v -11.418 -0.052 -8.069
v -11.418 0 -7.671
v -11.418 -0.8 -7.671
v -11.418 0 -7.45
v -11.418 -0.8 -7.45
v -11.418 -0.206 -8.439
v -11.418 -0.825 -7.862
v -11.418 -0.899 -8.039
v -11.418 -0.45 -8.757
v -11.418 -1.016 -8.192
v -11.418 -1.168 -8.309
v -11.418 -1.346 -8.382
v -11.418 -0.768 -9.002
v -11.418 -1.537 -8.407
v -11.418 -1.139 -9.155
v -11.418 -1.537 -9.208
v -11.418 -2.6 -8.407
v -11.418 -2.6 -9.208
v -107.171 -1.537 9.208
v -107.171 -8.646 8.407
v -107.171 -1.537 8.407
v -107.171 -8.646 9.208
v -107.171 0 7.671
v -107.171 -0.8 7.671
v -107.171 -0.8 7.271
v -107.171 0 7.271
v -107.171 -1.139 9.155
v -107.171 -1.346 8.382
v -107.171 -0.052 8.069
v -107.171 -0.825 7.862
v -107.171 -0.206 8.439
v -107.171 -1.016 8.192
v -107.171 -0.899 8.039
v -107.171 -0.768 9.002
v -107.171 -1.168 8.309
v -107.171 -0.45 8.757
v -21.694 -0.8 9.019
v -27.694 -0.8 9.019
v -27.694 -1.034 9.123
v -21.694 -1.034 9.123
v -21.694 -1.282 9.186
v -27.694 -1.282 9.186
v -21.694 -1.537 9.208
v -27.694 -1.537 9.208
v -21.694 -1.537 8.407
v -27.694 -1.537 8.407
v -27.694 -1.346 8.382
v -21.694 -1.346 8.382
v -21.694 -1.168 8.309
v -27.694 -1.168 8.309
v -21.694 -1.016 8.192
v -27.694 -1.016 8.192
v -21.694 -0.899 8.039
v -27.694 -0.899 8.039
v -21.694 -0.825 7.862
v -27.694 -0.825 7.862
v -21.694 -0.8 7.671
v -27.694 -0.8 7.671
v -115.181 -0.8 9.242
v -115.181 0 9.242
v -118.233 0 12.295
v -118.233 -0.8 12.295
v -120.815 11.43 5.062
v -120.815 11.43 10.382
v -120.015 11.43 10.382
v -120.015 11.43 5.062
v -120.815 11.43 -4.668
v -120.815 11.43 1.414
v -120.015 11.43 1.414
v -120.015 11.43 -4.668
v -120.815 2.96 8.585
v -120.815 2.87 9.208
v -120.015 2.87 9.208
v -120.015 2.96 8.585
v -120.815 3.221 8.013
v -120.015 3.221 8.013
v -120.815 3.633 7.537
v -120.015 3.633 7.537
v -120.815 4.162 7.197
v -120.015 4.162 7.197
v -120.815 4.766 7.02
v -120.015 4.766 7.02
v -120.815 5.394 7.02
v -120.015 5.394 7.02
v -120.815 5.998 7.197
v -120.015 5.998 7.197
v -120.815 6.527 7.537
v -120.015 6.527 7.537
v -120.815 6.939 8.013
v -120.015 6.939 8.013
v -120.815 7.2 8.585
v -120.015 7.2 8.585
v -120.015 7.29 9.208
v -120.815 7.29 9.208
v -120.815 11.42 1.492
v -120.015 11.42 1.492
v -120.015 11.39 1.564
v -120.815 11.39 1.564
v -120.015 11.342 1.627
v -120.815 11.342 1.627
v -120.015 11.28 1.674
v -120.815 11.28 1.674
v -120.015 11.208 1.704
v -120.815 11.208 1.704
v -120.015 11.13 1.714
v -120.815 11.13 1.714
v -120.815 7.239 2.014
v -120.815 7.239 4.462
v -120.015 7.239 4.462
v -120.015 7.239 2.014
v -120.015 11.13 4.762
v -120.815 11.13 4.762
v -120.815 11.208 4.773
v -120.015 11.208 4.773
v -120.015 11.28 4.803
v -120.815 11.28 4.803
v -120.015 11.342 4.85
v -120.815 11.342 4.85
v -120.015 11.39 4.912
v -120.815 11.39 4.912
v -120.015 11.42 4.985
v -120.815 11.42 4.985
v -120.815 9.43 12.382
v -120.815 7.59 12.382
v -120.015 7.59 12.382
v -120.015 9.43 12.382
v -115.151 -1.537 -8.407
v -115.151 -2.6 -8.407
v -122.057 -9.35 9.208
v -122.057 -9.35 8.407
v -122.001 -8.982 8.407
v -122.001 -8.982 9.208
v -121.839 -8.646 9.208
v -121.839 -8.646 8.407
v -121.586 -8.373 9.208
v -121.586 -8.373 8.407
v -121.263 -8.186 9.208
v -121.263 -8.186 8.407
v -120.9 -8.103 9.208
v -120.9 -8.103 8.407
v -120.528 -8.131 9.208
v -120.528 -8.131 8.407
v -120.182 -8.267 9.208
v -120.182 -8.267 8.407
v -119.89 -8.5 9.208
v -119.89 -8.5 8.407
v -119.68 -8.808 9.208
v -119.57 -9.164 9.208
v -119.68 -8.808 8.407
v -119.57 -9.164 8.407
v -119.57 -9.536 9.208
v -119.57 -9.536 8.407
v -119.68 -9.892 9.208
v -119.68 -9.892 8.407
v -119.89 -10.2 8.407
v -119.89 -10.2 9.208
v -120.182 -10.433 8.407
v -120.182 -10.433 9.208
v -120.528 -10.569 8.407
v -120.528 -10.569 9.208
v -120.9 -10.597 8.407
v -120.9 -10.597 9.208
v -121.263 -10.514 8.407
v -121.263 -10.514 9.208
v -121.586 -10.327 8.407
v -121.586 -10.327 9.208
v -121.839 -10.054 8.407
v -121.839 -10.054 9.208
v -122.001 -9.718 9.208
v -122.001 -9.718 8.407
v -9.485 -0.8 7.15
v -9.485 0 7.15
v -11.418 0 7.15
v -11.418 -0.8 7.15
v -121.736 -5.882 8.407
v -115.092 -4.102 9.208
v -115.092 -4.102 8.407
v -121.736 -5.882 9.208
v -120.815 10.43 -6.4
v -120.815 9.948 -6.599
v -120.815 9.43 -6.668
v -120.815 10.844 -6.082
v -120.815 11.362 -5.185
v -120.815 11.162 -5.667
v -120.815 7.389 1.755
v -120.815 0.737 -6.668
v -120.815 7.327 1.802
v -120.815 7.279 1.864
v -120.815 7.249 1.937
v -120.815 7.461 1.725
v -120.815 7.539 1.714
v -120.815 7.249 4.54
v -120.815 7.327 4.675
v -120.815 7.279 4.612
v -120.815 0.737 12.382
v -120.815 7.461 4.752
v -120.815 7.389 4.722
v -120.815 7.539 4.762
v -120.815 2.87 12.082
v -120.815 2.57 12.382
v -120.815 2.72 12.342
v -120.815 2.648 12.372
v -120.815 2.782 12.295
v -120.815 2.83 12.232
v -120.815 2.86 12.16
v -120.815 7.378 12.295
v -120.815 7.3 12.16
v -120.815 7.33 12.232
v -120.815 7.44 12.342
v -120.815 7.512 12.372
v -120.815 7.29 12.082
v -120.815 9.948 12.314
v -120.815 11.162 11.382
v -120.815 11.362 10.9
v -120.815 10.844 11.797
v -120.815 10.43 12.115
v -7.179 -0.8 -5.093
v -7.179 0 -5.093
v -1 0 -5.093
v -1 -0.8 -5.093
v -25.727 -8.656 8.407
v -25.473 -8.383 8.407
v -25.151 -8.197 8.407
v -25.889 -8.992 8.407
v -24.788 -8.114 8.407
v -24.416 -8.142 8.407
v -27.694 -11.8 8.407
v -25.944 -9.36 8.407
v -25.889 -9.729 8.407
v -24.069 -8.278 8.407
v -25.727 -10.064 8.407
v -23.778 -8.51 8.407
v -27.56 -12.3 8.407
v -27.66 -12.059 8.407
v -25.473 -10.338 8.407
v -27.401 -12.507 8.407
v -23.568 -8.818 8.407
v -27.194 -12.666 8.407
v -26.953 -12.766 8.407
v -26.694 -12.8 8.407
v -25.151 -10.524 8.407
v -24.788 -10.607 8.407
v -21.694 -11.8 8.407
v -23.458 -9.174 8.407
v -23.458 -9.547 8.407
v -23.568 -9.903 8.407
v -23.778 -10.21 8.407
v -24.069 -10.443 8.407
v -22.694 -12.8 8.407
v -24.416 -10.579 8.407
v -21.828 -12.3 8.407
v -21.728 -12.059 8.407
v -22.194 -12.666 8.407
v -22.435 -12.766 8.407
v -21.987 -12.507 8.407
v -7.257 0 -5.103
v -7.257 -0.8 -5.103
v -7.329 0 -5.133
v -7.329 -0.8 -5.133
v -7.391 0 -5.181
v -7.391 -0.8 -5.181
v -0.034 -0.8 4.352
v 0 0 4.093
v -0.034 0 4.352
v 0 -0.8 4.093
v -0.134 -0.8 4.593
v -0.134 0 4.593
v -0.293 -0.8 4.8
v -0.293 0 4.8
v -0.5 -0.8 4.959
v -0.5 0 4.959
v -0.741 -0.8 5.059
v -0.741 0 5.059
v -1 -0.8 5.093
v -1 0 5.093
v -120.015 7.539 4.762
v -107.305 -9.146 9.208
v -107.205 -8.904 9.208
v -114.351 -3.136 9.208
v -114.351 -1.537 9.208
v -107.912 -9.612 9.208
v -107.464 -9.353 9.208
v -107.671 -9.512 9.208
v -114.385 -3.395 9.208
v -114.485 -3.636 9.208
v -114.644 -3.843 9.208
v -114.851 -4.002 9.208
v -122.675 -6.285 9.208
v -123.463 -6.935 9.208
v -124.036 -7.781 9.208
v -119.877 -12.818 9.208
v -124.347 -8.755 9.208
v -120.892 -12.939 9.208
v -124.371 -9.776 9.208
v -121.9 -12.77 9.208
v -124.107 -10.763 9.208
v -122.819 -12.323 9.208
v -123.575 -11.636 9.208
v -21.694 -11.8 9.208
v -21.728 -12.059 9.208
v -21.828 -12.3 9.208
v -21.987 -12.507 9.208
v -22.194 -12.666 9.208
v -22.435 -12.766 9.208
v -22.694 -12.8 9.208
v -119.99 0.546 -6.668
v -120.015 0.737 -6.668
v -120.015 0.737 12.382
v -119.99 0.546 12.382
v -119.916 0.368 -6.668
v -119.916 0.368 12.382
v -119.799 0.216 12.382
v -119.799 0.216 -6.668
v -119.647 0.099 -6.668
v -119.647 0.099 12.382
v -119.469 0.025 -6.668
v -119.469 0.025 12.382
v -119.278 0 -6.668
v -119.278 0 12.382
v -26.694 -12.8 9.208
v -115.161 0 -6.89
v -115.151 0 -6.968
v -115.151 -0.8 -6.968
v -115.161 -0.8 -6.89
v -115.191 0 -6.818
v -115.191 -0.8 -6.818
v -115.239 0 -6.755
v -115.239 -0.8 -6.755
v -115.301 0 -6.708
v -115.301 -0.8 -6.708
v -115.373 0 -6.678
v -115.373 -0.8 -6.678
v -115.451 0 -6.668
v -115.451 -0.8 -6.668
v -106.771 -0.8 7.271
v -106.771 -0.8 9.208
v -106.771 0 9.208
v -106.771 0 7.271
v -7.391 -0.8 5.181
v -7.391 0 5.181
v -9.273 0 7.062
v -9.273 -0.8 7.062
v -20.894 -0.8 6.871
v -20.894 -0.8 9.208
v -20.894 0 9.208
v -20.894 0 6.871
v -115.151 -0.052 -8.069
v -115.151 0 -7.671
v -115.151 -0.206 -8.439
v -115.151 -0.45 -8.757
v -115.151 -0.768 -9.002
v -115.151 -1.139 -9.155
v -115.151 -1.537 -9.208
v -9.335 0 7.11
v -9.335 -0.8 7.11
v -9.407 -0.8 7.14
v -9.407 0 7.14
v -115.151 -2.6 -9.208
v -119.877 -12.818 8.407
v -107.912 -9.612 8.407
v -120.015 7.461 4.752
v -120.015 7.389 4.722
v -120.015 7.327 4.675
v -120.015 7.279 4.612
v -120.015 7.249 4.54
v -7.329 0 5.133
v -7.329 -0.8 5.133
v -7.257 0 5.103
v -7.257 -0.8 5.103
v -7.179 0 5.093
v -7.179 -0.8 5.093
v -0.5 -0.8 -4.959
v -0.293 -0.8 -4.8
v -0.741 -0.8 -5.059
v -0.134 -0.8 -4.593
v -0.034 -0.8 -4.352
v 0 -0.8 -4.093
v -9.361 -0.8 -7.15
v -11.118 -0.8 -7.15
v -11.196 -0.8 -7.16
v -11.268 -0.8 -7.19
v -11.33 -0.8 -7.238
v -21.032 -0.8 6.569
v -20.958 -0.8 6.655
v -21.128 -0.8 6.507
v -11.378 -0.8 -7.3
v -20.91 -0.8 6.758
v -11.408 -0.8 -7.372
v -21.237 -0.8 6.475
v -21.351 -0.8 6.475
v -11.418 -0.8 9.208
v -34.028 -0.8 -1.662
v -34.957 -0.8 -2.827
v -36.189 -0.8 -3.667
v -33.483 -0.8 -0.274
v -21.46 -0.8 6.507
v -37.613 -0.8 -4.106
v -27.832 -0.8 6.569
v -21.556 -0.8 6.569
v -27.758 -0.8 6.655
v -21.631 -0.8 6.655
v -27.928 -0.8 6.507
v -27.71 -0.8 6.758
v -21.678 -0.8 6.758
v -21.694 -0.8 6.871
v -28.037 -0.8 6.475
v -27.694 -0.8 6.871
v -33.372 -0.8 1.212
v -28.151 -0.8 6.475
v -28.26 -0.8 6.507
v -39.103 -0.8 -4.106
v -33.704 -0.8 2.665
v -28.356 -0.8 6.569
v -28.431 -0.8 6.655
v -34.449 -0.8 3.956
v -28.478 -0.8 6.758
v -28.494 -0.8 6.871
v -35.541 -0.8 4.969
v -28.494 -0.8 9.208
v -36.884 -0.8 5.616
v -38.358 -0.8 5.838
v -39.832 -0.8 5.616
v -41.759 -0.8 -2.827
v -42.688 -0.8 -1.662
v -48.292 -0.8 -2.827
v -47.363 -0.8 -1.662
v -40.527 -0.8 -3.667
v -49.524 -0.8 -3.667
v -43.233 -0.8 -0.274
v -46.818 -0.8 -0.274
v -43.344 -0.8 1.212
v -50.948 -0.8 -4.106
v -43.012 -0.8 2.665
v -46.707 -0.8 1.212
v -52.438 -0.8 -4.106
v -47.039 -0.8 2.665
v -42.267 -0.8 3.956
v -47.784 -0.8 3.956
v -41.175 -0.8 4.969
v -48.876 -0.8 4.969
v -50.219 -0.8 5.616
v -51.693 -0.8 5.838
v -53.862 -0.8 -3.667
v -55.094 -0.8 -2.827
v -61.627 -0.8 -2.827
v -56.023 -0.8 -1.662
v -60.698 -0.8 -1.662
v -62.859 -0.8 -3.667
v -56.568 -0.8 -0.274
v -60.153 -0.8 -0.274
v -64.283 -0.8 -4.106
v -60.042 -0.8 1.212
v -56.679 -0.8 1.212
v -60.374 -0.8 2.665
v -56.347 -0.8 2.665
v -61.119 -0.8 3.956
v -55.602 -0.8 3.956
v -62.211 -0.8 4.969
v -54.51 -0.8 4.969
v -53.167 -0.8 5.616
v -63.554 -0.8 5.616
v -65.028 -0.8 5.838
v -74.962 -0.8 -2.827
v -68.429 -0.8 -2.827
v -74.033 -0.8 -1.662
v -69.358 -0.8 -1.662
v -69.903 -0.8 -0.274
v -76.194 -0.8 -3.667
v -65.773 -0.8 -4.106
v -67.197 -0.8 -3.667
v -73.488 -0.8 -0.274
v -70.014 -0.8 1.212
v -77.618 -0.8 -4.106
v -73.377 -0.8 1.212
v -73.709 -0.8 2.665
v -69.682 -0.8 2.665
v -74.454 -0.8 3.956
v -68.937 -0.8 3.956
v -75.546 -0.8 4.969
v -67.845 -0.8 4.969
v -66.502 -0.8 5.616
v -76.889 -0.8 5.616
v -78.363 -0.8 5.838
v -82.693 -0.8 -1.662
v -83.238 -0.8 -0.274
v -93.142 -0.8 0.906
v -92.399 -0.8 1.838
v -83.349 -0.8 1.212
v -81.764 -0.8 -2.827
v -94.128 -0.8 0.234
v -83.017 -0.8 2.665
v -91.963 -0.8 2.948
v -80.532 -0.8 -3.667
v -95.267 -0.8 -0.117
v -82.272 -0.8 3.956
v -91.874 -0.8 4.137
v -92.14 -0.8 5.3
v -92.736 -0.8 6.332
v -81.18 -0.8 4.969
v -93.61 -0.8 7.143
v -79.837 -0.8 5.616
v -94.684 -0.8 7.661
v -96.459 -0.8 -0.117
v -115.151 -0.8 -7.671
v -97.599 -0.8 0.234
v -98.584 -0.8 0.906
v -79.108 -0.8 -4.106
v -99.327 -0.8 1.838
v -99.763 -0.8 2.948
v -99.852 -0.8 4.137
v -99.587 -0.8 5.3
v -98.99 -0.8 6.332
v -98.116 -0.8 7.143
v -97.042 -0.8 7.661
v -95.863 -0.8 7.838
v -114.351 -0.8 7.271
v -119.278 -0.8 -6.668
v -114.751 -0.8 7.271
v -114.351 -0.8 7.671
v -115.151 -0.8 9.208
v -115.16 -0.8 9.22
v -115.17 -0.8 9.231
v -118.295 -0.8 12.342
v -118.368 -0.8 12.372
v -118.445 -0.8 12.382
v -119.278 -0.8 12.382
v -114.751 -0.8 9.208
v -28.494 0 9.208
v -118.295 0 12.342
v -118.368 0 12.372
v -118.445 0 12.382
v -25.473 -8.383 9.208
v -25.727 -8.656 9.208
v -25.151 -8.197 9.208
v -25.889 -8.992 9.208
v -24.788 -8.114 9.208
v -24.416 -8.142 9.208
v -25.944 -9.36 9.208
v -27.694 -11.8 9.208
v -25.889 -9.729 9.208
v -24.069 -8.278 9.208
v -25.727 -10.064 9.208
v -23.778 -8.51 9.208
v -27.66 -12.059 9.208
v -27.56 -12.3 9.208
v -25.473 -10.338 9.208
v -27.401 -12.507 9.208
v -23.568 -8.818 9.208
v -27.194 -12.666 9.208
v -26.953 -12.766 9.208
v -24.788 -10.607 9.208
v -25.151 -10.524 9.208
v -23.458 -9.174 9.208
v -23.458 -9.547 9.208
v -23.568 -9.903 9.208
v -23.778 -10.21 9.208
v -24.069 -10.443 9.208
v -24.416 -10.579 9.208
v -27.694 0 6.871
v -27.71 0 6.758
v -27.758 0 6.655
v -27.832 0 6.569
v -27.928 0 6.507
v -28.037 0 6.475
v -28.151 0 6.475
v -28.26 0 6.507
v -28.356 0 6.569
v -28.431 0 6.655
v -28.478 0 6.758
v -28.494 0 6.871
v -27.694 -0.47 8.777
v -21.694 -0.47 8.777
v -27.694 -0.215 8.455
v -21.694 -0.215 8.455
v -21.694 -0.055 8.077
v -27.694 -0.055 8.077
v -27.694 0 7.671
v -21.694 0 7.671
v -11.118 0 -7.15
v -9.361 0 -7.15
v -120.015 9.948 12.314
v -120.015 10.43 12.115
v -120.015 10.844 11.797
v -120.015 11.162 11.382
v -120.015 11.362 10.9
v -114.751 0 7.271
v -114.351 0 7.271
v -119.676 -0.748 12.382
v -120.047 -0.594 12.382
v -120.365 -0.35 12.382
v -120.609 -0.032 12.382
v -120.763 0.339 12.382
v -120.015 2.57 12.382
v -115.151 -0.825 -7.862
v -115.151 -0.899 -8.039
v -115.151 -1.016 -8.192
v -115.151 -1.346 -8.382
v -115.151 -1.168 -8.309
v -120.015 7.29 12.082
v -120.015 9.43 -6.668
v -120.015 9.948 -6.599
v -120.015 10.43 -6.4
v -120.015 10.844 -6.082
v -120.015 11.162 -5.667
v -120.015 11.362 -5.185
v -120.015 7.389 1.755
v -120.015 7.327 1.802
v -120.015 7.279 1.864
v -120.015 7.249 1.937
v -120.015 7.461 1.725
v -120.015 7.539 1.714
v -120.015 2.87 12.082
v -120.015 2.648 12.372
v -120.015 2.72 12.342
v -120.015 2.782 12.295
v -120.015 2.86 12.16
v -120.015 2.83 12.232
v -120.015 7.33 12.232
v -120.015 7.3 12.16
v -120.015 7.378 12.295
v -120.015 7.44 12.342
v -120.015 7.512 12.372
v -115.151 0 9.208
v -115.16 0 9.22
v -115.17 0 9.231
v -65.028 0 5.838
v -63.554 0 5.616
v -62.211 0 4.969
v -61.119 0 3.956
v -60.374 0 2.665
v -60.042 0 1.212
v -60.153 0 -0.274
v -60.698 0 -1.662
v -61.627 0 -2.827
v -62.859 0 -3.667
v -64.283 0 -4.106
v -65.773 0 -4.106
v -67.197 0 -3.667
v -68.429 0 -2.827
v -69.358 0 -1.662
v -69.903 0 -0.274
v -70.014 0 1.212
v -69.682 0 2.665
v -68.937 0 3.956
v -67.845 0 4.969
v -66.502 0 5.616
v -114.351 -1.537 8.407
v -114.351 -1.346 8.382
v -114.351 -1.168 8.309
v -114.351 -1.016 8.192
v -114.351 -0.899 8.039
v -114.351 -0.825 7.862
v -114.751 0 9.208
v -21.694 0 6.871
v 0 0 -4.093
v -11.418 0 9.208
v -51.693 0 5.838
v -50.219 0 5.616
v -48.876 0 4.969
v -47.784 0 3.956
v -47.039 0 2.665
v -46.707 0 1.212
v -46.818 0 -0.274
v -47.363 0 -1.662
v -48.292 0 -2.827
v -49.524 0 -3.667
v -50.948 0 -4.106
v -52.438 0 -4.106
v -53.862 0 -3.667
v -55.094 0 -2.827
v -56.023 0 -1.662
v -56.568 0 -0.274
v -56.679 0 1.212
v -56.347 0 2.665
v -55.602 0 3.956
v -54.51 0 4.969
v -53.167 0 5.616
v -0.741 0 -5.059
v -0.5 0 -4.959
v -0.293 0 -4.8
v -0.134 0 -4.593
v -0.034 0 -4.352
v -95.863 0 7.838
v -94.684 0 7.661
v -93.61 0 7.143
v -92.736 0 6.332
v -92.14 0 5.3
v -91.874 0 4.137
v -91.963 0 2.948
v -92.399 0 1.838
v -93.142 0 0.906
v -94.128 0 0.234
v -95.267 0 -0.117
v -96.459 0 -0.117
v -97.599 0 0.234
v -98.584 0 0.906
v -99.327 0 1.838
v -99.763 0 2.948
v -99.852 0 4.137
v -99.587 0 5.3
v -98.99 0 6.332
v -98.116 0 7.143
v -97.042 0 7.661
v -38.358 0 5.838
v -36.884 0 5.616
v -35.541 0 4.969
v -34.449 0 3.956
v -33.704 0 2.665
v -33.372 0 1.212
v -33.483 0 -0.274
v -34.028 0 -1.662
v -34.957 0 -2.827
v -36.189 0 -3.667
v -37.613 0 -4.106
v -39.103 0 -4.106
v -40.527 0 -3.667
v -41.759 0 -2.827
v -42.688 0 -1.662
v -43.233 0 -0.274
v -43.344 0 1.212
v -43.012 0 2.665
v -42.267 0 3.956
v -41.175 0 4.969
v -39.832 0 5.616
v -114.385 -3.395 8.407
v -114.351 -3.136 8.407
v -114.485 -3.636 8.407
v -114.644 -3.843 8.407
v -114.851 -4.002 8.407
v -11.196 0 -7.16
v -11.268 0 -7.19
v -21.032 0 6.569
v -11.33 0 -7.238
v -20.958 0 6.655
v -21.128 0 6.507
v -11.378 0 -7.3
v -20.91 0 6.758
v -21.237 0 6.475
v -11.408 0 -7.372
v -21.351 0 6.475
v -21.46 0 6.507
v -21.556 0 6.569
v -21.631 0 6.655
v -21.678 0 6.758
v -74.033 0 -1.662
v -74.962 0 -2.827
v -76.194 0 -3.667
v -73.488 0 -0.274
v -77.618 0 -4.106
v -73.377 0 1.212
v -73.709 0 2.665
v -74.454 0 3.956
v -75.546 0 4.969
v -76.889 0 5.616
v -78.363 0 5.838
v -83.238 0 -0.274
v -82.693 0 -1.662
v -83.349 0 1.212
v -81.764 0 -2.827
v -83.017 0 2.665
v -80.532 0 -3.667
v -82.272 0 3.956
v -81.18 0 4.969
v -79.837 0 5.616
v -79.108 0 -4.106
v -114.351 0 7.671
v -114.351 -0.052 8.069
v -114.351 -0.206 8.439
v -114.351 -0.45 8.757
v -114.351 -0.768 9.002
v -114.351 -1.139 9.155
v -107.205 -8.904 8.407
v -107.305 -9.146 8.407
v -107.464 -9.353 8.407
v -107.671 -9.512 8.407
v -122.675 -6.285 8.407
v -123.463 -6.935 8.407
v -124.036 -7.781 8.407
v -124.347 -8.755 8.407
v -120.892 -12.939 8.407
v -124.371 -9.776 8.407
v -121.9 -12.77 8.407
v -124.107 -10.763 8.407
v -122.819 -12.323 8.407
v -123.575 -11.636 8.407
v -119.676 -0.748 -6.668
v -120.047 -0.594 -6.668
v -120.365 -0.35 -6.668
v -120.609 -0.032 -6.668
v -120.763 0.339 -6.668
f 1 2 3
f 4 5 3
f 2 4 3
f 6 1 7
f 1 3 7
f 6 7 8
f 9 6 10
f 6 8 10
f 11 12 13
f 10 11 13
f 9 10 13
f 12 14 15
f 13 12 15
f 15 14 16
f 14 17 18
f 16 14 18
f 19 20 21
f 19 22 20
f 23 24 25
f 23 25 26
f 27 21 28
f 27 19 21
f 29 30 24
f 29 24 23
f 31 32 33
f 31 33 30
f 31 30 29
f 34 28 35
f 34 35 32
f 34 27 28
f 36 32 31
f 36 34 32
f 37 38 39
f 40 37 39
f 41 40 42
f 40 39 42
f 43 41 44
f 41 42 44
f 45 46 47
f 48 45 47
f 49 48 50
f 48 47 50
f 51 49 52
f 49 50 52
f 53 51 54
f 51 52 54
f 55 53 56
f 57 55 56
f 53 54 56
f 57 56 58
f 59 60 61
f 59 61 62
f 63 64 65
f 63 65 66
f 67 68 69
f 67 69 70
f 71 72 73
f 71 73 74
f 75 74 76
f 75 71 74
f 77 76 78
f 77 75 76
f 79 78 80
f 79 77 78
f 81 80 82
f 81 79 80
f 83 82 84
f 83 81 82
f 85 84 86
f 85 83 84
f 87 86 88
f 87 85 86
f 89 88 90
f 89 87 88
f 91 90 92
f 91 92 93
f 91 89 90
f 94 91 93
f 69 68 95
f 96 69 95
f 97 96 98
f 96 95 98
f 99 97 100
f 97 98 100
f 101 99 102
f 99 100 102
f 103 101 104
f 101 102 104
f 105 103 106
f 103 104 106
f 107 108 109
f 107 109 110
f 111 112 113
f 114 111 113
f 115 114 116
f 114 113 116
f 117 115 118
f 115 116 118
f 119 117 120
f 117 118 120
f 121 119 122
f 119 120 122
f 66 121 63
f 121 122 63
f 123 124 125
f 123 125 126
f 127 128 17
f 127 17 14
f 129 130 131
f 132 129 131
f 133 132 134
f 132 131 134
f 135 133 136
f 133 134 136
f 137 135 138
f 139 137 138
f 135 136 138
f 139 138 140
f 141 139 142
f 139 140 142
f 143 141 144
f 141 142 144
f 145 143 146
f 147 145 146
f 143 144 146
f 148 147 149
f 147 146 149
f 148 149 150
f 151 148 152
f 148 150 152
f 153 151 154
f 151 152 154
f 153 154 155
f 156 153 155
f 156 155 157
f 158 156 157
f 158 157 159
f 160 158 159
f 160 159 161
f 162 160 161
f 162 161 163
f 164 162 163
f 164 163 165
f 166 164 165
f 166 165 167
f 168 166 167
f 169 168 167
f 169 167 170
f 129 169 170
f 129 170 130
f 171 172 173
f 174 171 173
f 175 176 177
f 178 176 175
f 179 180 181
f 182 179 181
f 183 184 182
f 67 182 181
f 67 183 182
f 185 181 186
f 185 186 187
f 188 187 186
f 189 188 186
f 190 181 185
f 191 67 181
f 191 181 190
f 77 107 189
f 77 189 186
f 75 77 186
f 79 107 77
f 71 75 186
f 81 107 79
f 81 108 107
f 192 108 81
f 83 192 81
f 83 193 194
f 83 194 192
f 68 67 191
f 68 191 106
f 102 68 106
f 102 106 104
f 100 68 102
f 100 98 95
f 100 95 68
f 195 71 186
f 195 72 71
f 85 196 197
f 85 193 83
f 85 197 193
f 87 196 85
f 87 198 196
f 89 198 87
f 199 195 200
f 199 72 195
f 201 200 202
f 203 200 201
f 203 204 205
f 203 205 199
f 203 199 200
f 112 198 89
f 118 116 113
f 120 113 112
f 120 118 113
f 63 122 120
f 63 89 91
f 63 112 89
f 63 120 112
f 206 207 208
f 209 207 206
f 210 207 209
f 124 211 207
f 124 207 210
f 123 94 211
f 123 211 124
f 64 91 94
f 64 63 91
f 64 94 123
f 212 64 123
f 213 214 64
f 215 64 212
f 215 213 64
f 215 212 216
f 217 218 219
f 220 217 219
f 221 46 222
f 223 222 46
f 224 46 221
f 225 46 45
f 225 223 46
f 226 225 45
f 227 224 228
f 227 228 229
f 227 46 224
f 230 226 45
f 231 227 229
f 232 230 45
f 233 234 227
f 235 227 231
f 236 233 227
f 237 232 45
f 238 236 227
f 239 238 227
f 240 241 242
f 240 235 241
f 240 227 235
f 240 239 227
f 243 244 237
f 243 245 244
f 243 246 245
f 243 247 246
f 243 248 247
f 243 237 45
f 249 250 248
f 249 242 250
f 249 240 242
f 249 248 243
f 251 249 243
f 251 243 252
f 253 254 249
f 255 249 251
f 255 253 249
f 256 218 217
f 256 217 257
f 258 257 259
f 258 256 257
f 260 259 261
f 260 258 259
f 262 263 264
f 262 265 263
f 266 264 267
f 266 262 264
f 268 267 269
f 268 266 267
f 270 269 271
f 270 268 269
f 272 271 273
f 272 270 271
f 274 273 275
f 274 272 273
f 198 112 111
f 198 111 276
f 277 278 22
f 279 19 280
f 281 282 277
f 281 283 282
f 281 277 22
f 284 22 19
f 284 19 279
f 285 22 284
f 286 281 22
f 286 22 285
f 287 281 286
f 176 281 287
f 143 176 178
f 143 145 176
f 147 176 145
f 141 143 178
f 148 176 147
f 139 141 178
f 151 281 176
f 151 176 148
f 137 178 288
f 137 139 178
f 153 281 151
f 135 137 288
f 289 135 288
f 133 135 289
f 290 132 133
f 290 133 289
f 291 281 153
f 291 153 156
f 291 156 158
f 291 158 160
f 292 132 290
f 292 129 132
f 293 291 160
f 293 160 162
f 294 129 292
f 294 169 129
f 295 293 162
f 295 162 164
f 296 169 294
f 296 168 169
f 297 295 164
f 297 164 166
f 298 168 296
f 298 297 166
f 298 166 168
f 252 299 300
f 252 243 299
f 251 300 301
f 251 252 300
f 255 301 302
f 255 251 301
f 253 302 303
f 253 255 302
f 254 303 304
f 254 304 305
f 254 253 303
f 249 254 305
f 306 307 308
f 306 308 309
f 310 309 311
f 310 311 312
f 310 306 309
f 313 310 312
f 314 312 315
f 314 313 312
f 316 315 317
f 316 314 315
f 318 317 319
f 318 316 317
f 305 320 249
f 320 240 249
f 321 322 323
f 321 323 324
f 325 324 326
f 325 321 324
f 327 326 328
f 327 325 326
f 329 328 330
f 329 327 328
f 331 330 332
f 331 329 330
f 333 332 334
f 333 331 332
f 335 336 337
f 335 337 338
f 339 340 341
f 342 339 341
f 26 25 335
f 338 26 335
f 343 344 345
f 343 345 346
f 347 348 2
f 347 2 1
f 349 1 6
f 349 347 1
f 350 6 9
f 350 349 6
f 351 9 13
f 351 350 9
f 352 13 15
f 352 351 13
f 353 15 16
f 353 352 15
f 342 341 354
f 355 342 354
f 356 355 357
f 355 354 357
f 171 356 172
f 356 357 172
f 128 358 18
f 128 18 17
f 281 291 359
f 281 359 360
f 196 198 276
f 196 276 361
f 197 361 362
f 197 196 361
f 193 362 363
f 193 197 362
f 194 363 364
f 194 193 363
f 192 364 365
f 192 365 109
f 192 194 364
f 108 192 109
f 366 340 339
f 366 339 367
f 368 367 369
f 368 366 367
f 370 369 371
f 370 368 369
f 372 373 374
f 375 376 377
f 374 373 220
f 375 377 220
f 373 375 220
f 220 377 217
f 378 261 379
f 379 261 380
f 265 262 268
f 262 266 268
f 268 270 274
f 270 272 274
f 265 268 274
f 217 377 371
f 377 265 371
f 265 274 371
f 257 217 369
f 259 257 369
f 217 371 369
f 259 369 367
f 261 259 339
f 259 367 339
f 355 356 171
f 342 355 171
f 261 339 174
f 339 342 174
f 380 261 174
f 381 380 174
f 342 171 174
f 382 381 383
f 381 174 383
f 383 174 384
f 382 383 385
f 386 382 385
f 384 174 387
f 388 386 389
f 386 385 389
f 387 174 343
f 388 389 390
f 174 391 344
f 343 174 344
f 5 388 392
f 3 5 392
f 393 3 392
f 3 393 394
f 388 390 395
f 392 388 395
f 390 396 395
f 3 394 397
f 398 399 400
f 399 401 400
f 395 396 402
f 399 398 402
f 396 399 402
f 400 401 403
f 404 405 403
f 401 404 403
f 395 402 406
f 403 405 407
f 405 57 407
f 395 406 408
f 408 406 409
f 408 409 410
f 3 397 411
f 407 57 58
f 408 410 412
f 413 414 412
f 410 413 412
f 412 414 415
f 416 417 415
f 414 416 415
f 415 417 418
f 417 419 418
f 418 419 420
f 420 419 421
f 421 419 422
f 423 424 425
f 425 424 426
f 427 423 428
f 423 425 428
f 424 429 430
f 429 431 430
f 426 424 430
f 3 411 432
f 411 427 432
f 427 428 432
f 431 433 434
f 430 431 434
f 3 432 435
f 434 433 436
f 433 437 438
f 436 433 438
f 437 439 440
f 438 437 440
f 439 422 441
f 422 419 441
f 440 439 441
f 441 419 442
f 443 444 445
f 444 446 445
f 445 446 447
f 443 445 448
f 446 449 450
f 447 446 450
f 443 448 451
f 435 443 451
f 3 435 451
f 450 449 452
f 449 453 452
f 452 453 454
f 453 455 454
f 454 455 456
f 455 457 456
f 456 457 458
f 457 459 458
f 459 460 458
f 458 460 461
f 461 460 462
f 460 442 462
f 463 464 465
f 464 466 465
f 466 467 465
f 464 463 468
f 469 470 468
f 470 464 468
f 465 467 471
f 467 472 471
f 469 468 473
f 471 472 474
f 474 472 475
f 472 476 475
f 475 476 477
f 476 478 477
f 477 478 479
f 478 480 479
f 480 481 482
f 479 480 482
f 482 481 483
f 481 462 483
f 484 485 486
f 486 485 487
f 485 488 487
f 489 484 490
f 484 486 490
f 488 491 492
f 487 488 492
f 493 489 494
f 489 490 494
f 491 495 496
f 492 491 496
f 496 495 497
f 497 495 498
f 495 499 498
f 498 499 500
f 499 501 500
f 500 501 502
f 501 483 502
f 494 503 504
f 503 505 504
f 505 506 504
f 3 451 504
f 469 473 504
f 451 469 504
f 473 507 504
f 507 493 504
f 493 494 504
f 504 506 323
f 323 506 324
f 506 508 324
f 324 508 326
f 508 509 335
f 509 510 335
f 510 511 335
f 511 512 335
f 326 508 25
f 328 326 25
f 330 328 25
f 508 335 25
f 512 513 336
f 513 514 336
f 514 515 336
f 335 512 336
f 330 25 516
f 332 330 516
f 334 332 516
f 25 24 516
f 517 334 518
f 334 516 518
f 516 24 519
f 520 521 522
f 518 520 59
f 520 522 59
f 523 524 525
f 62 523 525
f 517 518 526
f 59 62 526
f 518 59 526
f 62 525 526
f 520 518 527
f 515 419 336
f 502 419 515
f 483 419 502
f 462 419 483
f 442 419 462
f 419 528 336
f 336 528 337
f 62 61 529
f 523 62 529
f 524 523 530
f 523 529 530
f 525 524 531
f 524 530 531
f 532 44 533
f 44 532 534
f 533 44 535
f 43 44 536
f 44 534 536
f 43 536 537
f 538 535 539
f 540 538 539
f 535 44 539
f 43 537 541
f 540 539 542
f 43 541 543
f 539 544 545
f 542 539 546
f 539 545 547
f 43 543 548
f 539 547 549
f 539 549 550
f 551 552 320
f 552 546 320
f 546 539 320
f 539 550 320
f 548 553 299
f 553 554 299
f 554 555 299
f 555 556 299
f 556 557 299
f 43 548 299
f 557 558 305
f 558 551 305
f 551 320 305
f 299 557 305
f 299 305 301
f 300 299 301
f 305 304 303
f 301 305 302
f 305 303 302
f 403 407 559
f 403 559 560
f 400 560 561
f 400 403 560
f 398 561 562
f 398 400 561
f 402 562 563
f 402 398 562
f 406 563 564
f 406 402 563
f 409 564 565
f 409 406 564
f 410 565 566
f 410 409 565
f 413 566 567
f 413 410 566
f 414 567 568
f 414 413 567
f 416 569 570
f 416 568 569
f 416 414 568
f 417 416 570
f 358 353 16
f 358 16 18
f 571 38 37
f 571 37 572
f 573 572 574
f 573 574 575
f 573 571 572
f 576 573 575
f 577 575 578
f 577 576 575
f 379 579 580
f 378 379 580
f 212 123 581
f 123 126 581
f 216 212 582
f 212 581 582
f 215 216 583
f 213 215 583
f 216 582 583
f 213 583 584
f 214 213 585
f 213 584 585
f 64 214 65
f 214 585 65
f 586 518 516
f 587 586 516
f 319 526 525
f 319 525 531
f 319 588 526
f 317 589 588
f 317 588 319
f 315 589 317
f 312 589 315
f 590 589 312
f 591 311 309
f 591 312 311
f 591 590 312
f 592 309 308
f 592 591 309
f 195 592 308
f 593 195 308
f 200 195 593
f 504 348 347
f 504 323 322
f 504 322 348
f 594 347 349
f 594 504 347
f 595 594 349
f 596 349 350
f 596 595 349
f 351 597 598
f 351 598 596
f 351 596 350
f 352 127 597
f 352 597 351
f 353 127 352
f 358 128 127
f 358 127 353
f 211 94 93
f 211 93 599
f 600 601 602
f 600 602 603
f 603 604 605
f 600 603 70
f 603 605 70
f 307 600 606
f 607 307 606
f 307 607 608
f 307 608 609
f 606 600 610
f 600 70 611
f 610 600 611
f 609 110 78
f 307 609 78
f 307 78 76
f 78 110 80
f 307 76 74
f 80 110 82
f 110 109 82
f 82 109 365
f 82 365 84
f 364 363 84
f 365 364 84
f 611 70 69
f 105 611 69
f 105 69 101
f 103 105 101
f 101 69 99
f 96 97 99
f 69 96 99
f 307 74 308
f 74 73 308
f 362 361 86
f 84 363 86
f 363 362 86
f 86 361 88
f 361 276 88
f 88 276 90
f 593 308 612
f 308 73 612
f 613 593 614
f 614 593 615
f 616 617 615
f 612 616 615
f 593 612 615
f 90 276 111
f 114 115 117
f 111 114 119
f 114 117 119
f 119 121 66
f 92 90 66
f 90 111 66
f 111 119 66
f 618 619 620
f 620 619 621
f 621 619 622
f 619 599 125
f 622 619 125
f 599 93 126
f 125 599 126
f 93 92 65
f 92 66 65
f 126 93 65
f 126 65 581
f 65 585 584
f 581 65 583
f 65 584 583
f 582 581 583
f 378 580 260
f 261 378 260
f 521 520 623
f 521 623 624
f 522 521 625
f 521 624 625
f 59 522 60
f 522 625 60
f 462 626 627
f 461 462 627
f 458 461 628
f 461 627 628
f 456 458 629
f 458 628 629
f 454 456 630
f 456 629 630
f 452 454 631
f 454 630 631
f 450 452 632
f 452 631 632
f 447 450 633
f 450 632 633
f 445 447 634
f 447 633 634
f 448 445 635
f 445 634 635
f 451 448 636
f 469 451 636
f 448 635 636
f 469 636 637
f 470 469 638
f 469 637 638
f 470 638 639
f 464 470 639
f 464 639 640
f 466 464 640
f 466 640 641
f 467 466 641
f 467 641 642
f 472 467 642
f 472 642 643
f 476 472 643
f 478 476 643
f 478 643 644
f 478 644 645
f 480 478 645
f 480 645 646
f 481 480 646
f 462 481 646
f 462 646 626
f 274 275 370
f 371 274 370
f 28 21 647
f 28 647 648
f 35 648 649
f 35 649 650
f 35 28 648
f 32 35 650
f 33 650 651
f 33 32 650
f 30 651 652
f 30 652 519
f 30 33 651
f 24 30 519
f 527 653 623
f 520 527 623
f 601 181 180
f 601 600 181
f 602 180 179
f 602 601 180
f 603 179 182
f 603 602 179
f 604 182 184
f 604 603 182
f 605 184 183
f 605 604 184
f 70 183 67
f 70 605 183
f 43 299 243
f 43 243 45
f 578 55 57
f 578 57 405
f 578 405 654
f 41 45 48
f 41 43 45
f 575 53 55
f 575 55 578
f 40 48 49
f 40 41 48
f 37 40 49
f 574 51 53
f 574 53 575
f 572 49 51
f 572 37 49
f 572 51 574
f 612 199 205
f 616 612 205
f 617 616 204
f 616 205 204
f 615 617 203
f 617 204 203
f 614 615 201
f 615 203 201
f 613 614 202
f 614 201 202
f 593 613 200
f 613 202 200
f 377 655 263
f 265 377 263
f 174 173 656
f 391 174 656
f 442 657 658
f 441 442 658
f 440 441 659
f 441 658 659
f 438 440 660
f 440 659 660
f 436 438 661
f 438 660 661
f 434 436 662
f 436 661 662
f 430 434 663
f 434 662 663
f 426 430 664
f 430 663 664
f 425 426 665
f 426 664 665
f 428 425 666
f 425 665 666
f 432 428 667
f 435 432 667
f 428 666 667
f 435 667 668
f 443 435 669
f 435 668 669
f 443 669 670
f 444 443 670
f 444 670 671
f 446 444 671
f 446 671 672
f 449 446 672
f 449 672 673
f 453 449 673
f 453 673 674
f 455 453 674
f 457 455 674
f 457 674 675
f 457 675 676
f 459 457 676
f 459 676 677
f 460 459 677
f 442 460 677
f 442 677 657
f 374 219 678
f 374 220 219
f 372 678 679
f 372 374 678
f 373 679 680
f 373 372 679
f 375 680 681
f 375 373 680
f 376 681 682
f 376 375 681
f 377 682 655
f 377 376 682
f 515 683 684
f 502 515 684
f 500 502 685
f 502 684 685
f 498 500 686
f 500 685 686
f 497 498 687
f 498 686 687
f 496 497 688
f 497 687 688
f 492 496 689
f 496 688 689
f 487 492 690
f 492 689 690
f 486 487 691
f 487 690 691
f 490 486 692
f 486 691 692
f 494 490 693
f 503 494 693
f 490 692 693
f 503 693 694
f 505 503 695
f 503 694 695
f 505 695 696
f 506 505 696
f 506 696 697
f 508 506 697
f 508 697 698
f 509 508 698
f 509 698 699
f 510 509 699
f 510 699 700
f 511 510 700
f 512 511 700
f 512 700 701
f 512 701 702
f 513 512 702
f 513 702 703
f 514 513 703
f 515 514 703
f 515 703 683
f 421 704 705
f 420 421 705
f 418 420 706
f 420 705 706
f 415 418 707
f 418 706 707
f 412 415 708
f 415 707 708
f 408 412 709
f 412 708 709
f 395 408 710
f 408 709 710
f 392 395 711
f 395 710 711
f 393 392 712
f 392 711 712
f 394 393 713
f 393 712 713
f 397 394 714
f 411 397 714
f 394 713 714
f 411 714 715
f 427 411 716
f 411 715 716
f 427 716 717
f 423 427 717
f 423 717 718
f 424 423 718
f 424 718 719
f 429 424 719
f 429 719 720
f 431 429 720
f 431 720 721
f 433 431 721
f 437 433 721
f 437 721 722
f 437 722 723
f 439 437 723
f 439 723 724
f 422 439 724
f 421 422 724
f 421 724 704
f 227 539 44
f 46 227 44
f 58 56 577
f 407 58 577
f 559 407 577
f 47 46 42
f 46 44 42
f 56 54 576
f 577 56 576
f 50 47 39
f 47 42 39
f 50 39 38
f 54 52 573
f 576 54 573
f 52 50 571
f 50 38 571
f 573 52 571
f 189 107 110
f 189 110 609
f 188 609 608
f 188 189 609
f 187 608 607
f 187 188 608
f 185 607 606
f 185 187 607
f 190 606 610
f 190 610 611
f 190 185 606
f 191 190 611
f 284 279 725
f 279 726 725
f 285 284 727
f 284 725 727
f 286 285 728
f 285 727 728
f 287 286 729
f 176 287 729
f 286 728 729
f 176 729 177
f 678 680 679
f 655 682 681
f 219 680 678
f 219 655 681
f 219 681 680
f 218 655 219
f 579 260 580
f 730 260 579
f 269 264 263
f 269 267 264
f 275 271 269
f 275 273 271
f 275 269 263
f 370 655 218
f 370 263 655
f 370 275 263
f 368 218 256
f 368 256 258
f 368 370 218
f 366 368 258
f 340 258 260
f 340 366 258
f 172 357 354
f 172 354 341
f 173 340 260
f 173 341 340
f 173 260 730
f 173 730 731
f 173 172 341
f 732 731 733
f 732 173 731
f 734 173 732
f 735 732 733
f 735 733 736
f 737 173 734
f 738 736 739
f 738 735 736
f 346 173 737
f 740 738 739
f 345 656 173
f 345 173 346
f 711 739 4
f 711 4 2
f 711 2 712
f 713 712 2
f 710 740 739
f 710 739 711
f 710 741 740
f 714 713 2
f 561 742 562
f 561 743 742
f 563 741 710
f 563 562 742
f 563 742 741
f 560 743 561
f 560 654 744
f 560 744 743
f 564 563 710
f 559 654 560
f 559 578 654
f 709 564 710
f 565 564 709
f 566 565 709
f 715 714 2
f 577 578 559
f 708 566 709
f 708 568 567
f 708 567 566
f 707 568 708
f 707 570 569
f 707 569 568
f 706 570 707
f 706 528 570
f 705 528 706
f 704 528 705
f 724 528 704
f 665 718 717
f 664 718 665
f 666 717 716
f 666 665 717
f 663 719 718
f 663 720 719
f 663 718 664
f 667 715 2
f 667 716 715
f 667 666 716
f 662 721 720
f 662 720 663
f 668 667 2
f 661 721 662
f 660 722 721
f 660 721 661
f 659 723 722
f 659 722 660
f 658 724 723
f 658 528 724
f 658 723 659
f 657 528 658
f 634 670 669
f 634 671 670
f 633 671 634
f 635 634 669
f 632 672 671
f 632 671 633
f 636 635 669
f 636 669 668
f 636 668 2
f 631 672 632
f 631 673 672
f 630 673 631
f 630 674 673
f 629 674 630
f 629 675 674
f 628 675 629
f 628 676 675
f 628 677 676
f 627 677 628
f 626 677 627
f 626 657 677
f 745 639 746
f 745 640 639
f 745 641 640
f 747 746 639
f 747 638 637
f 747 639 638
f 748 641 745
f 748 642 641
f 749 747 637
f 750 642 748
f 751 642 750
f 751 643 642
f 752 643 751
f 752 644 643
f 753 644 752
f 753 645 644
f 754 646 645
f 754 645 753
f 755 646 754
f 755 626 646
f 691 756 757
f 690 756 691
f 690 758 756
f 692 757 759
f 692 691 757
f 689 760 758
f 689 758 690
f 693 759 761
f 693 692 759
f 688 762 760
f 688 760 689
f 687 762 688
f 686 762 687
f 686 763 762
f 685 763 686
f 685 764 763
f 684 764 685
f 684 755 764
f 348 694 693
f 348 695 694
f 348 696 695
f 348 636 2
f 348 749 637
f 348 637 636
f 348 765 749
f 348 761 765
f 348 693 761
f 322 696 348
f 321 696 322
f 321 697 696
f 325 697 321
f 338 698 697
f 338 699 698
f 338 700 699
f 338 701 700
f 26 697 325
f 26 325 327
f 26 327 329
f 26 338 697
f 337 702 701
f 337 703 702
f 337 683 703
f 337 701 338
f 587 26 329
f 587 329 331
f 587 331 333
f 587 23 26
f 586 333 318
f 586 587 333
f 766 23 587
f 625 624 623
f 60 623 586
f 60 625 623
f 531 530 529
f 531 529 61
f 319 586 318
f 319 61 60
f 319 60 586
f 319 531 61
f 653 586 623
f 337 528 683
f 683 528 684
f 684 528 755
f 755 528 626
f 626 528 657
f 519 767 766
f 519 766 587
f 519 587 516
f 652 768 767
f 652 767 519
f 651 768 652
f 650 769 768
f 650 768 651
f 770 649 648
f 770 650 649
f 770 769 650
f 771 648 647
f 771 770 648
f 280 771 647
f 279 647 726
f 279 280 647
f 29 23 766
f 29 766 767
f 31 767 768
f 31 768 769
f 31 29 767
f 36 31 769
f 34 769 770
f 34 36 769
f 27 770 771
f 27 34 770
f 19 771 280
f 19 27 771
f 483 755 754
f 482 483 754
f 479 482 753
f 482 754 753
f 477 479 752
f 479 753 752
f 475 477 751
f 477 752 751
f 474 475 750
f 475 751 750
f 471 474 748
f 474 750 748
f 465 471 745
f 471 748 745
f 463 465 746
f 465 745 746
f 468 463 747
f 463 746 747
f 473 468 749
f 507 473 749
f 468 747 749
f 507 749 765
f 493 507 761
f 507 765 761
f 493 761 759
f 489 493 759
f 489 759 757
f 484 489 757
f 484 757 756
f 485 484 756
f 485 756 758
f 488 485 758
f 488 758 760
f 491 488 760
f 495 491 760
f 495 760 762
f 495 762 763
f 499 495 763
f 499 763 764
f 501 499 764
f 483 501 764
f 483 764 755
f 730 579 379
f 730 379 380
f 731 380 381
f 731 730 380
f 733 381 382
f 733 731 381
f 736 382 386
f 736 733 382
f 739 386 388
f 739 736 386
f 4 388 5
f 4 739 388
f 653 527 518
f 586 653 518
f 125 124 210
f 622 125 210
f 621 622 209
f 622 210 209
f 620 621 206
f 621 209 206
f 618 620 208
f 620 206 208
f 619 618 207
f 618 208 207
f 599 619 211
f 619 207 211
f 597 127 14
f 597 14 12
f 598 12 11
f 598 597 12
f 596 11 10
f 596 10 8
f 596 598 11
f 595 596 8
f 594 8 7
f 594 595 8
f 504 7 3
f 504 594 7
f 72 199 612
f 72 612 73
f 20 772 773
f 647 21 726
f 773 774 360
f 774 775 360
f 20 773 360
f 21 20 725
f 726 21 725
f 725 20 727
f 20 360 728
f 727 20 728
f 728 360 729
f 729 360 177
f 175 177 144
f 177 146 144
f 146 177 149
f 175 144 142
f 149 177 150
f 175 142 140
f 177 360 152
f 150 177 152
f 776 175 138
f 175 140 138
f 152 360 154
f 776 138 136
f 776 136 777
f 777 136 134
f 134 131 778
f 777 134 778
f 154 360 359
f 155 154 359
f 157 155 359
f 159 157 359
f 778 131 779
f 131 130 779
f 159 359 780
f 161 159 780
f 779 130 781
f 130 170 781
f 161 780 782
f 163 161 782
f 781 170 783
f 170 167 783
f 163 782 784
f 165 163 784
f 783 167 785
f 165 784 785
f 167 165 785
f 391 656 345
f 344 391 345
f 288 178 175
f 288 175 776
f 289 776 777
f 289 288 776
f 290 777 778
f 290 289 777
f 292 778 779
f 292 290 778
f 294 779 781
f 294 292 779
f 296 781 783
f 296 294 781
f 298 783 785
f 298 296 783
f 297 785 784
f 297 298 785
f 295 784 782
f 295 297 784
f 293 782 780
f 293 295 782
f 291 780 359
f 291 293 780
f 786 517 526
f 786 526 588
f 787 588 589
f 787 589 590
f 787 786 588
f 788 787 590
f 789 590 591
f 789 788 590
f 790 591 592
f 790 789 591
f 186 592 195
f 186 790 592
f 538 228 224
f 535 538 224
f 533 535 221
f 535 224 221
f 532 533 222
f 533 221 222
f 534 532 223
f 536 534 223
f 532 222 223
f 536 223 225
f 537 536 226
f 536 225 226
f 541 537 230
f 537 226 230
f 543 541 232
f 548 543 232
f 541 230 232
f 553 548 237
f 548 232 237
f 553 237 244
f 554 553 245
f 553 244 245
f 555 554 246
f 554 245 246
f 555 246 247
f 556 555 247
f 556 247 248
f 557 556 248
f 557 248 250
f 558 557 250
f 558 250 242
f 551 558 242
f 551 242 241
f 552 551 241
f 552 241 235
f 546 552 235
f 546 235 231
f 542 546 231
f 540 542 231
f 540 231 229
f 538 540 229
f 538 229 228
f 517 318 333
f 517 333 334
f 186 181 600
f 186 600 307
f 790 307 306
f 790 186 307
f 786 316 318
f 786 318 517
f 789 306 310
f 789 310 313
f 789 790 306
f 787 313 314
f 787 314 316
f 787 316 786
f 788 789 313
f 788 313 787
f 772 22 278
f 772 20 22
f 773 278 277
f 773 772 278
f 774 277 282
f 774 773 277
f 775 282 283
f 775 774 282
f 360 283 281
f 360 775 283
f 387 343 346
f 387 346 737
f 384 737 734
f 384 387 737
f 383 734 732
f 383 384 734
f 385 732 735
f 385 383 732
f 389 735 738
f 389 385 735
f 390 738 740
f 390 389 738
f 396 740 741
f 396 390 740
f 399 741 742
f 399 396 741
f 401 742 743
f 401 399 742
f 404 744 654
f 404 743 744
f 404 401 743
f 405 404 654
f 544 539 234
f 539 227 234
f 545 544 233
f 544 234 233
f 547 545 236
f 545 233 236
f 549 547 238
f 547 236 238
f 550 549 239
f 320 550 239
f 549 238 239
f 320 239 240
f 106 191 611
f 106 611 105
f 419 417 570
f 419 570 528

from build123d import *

# Parameters (mm, degrees)
BASE_FLANGE1_DEPTH            = 0.8
EDGE_FLANGE1_STRIP_W          = 4.6732
EDGE_FLANGE1_STRIP_H          = 0.8
EDGE_FLANGE1_STRIP_CUT_DEPTH  = 19.05
EDGE_FLANGE1_DEPTH            = 19.05
EDGE_FLANGE1_START            = 0.8
EDGE_FLANGE1_FLAT_DEPTH       = 0.8
CHAMFER2_SIZE                 = 3.17
EDGE_FLANGE2_START            = -1.5366
EDGE_FLANGE2_DEPTH            = 2.5366
EDGE_FLANGE2_START_2          = -0.084496
EDGE_FLANGE2_2_OUTLINE_W      = 6
EDGE_FLANGE2_2_OUTLINE_H      = 0.8
EDGE_FLANGE2_2_DEPTH          = 1.084496
EDGE_FLANGE2_START_3          = -12.8
EDGE_FLANGE2_3_OUTLINE_W      = 6
EDGE_FLANGE2_3_OUTLINE_H      = 0.8
EDGE_FLANGE2_3_DEPTH          = 11.2634
EDGE_FLANGE2_START_4          = -27.694130054
EDGE_FLANGE2_4_DEPTH          = 6
EDGE_FLANGE2_5_DEPTH          = 6
EDGE_FLANGE4_STRIP_W          = 4.6732
EDGE_FLANGE4_STRIP_H          = 0.8
EDGE_FLANGE4_STRIP_CUT_DEPTH  = 7.17999872
EDGE_FLANGE4_RELIEF_W         = 5.0732
EDGE_FLANGE4_RELIEF_H         = 0.4
EDGE_FLANGE4_RELIEF_CUT_DEPTH = 0.8
EDGE_FLANGE4_DEPTH            = 7.17999872
EDGE_FLANGE4_FLAT_DEPTH       = 0.8
M3X0_5_TAPPED_HOLE1_D         = 2.5
EDGE_FLANGE3_STRIP_W          = 4.6732
EDGE_FLANGE3_STRIP_H          = 0.8
EDGE_FLANGE3_STRIP_CUT_DEPTH  = 103.732625794
EDGE_FLANGE3_DEPTH            = 103.732625794
SKETCH21_R                    = 5
SKETCH21_R_2                  = 4
CUT_EXTRUDE1_DEPTH            = 126.679221242
FILLET1_R                     = 1
FILLET3_R                     = 2
FILLET4_R                     = 0.3
FILLET5_R                     = 1


with BuildPart() as part:
    # Base-Flange1: sheet metal written as solids
    # Sketch2 → Base-Flange1 (new body)
    with BuildSketch(Plane(origin=(0, 0, 0), x_dir=(1, 0, 0), z_dir=(0, 1, 0))):
        Polygon((-115.1509, -12.3825), (-120.015, -12.3825), (-120.015, 6.6675), (-115.1509, 6.6675), (-115.1509, 9.2075), (-11.418274206, 9.2075), (-11.418274206, 7.1501), (-9.360874206, 7.1501), (-7.303474206, 5.0927), (0, 5.0927), (0, -5.0927), (-7.303474206, -5.0927), (-9.360874206, -7.1501), (-11.418274206, -7.1501), (-11.418274206, -9.2075), (-115.1509, -9.2075), align=None)
    extrude(amount=-BASE_FLANGE1_DEPTH)

    # Edge-Flange1: sheet metal written as solids
    # Edge-Flange1 strip (on a plane across the edge) → Edge-Flange1 strip cut (cut)
    with BuildSketch(Plane(origin=(-120.015, 0, -6.6675), x_dir=(1, 0, 0), z_dir=(0, 0, 1))):
        with Locations((-1.6, -0.4)):
            Rectangle(EDGE_FLANGE1_STRIP_W, EDGE_FLANGE1_STRIP_H)
    extrude(amount=EDGE_FLANGE1_STRIP_CUT_DEPTH, mode=Mode.SUBTRACT)

    # Edge-Flange1 bend section (on a plane across the edge) → Edge-Flange1 (add)
    with BuildSketch(Plane(origin=(-120.015, 0, -6.6675), x_dir=(1, 0, 0), z_dir=(0, 0, 1))):
        with BuildLine():
            Line((-0.8, 0.7366), (0, 0.7366))
            ThreePointArc((0, 0.7366), (0.215745145, 0.215745145), (0.7366, 0))
            Line((0.7366, 0), (0.7366, -0.8))
            ThreePointArc((0.7366, -0.8), (-0.34994028, -0.34994028), (-0.8, 0.7366))
        make_face()
    extrude(amount=EDGE_FLANGE1_DEPTH)

    # Edge-Flange1 profile (on flange) → Edge-Flange1 flat (add)
    with BuildSketch(Plane.ZY.offset(120.015).offset(EDGE_FLANGE1_START)):
        with BuildLine():
            ThreePointArc((9.2075, 2.8702), (6.9977, 5.08), (9.2075, 7.2898))
            Line((9.2075, 7.2898), (12.3825, 7.2898))
            Line((12.3825, 7.2898), (12.3825, 11.43))
            Line((12.3825, 11.43), (4.7625, 11.43))
            Line((4.7625, 11.43), (4.7625, 7.239))
            Line((4.7625, 7.239), (1.7145, 7.239))
            Line((1.7145, 7.239), (1.7145, 11.43))
            Line((1.7145, 11.43), (-6.6675, 11.43))
            Line((-6.6675, 11.43), (-6.6675, 0.7366))
            Line((-6.6675, 0.7366), (12.3825, 0.7366))
            Line((12.3825, 0.7366), (12.3825, 2.8702))
            Line((12.3825, 2.8702), (9.2075, 2.8702))
        make_face()
    extrude(amount=-EDGE_FLANGE1_FLAT_DEPTH)

    # Chamfer2
    chamfer2_edges = [part.edges().sort_by_distance(p)[0] for p in [
        (-115.1509, -0.4, 12.3825),
    ]]
    chamfer(chamfer2_edges, length=CHAMFER2_SIZE)

    # Edge-Flange2: read off the stored shape, not the designer's step
    # Edge-Flange2 outline → Edge-Flange2 (cut)
    with BuildSketch(Plane(origin=(0, 0, 0), x_dir=(1, 0, 0), z_dir=(0, 1, 0)).offset(EDGE_FLANGE2_START)):
        with BuildLine():
            Line((-28.494130054, -9.2075), (-27.694130054, -9.2075))
            Line((-27.694130054, -9.2075), (-27.694130054, -6.8709))
            ThreePointArc((-27.694130054, -6.8709), (-28.094130054, -6.4709), (-28.494130054, -6.8709))
            Line((-28.494130054, -6.8709), (-28.494130054, -9.2075))
        make_face()
        with BuildLine():
            Line((-21.694130054, -6.8709), (-21.694130054, -9.2075))
            Line((-21.694130054, -9.2075), (-20.894130054, -9.2075))
            Line((-20.894130054, -9.2075), (-20.894130054, -6.8709))
            ThreePointArc((-20.894130054, -6.8709), (-21.294130054, -6.4709), (-21.694130054, -6.8709))
        make_face()
    extrude(amount=EDGE_FLANGE2_DEPTH, mode=Mode.SUBTRACT)

    # Edge-Flange2 2 outline → Edge-Flange2 2 (cut)
    with BuildSketch(Plane(origin=(0, 0, 0), x_dir=(1, 0, 0), z_dir=(0, 1, 0)).offset(EDGE_FLANGE2_START_2)):
        with Locations((-24.694130054, -8.8075)):
            Rectangle(EDGE_FLANGE2_2_OUTLINE_W, EDGE_FLANGE2_2_OUTLINE_H)
    extrude(amount=EDGE_FLANGE2_2_DEPTH, mode=Mode.SUBTRACT)

    # Edge-Flange2 4 outline → Edge-Flange2 4 (cut)
    with BuildSketch(Plane.YZ.offset(EDGE_FLANGE2_START_4)):
        with BuildLine():
            Line((-0.8, 9.2075), (-0.8, 9.019439951))
            ThreePointArc((-0.8, 9.019439951), (-0.215048049, 8.454889796), (0, 7.6709))
            Line((0, 7.6709), (0, 8.4075))
            Line((0, 8.4075), (-0.084496, 8.4075))
            Line((-0.084496, 8.4075), (-0.084496, 9.2075))
            Line((-0.084496, 9.2075), (-0.8, 9.2075))
        make_face()
    extrude(amount=EDGE_FLANGE2_4_DEPTH, mode=Mode.SUBTRACT)



with BuildPart() as body_2:
    # Edge-Flange2 3 outline → Edge-Flange2 3 (new body)
    with BuildSketch(Plane(origin=(0, 0, 0), x_dir=(1, 0, 0), z_dir=(0, 1, 0)).offset(EDGE_FLANGE2_START_3)):
        with Locations((-24.694130054, -8.8075)):
            Rectangle(EDGE_FLANGE2_3_OUTLINE_W, EDGE_FLANGE2_3_OUTLINE_H)
    extrude(amount=EDGE_FLANGE2_3_DEPTH)


with BuildPart() as part_1:
    add(part.part)

    add(body_2.part)  # Edge-Flange2 5 merges body 2
    # Edge-Flange2 5 outline → Edge-Flange2 5 (add)
    with BuildSketch(Plane.YZ.offset(EDGE_FLANGE2_START_4)):
        with BuildLine():
            ThreePointArc((-0.8, 9.019439951), (-1.156486155, 9.159742848), (-1.5366, 9.2075))
            Line((-1.5366, 9.2075), (-1.5366, 8.4075))
            ThreePointArc((-1.5366, 8.4075), (-1.015745145, 8.191754855), (-0.8, 7.6709))
            Line((-0.8, 7.6709), (-0.8, 9.019439951))
        make_face()
    extrude(amount=EDGE_FLANGE2_5_DEPTH)

    # Edge-Flange4: sheet metal written as solids
    # Edge-Flange4 strip (on a plane across the edge) → Edge-Flange4 strip cut (cut)
    with BuildSketch(Plane(origin=(-107.17090128, -0.8, 9.2075), x_dir=(0, 0, -1), z_dir=(-1, 0, 0))):
        with Locations((-0.8, -0.4)):
            Rectangle(EDGE_FLANGE4_STRIP_W, EDGE_FLANGE4_STRIP_H)
    extrude(amount=EDGE_FLANGE4_STRIP_CUT_DEPTH, mode=Mode.SUBTRACT)

    # Edge-Flange4 relief (on the sheet) → Edge-Flange4 relief cut (cut)
    with BuildSketch(Plane(origin=(-107.17090128, -0.8, 7.6709), x_dir=(0, 0, -1), z_dir=(0, -1, 0))):
        with Locations((-2.1366, 0.2)):
            Rectangle(EDGE_FLANGE4_RELIEF_W, EDGE_FLANGE4_RELIEF_H)
        with Locations((-2.1366, -7.37999872)):
            Rectangle(EDGE_FLANGE4_RELIEF_W, EDGE_FLANGE4_RELIEF_H)
    extrude(amount=-EDGE_FLANGE4_RELIEF_CUT_DEPTH, mode=Mode.SUBTRACT)

    # Edge-Flange4 bend section (on a plane across the edge) → Edge-Flange4 (add)
    with BuildSketch(Plane(origin=(-107.17090128, -0.8, 9.2075), x_dir=(0, 0, -1), z_dir=(-1, 0, 0))):
        with BuildLine():
            Line((0, 0.7366), (0.8, 0.7366))
            ThreePointArc((0.8, 0.7366), (1.015745145, 0.215745145), (1.5366, 0))
            Line((1.5366, 0), (1.5366, -0.8))
            ThreePointArc((1.5366, -0.8), (0.45005972, -0.34994028), (0, 0.7366))
        make_face()
    extrude(amount=EDGE_FLANGE4_DEPTH)

    # Edge-Flange4 profile (on flange) → Edge-Flange4 flat (add)
    with BuildSketch(Plane(origin=(0, -0.8, 9.2075), x_dir=(-1, 0, 0), z_dir=(0, 0, 1))):
        with BuildLine():
            ThreePointArc((121.735691381, 5.082325102), (124.274204272, 9.479158406), (119.877370968, 12.017671298))
            Line((119.877370968, 12.017671298), (107.17090128, 8.612983007))
            Line((107.17090128, 8.612983007), (107.17090128, 0.7366))
            Line((107.17090128, 0.7366), (114.3509, 0.7366))
            Line((114.3509, 0.7366), (114.3509, 3.103576215))
            Line((114.3509, 3.103576215), (121.735691381, 5.082325102))
        make_face()
    extrude(amount=-EDGE_FLANGE4_FLAT_DEPTH)

    # M3x0.5 Tapped Hole1 (through all)
    with Locations(Plane.XY.offset(9.2075)):
        with Locations((-120.806531174, -9.3499982), (-24.694130054, -9.36023907)):
            Hole(M3X0_5_TAPPED_HOLE1_D / 2)

    # Edge-Flange3: sheet metal written as solids
    # Edge-Flange3 strip (on a plane across the edge) → Edge-Flange3 strip cut (cut)
    with BuildSketch(Plane(origin=(-115.1509, -0.8, -9.2075), x_dir=(0, 0, 1), z_dir=(1, 0, 0))):
        with Locations((-0.8, -0.4)):
            Rectangle(EDGE_FLANGE3_STRIP_W, EDGE_FLANGE3_STRIP_H)
    extrude(amount=EDGE_FLANGE3_STRIP_CUT_DEPTH, mode=Mode.SUBTRACT)

    # Edge-Flange3 section (on a plane across the edge) → Edge-Flange3 (add)
    with BuildSketch(Plane(origin=(-115.1509, -0.8, -9.2075), x_dir=(0, 0, 1), z_dir=(1, 0, 0))):
        with BuildLine():
            Line((0, 0.7366), (0, 1.8))
            Line((0, 1.8), (0.8, 1.8))
            Line((0.8, 1.8), (0.8, 0.7366))
            ThreePointArc((0.8, 0.7366), (1.015745145, 0.215745145), (1.5366, 0))
            Line((1.5366, 0), (1.5366, -0.8))
            ThreePointArc((1.5366, -0.8), (0.45005972, -0.34994028), (0, 0.7366))
        make_face()
    extrude(amount=EDGE_FLANGE3_DEPTH)

    # Sketch21 → Cut-Extrude1 (cut, through all)
    with BuildSketch(Plane(origin=(0, 0, 0), x_dir=(1, 0, 0), z_dir=(0, 1, 0))):
        with Locations(Location((-78.363042127, -0.838303057, 0), (0, 0, 270))):
            Circle(SKETCH21_R)
        with Locations(Location((-95.863042127, -3.838303057, 0), (0, 0, 270))):
            Circle(SKETCH21_R_2)
        with Locations(Location((-65.028050672, -0.838303057, 0), (0, 0, 270))):
            Circle(SKETCH21_R)
        with Locations(Location((-51.693043958, -0.838303057, 0), (0, 0, 270))):
            Circle(SKETCH21_R)
        with Locations(Location((-38.358052503, -0.838303057, 0), (0, 0, 270))):
            Circle(SKETCH21_R)
    extrude(amount=-CUT_EXTRUDE1_DEPTH, mode=Mode.SUBTRACT)

    # Fillet1
    fillet1_edges = [part_1.edges().sort_by_distance(p)[0] for p in [
        (0, -0.4, -5.0927),
        (0, -0.4, 5.0927),
    ]]
    fillet(fillet1_edges, radius=FILLET1_R)

    # Fillet3
    fillet3_edges = [part_1.edges().sort_by_distance(p)[0] for p in [
        (-120.415, 11.43, -6.6675),
        (-120.415, 11.43, 12.3825),
    ]]
    fillet(fillet3_edges, radius=FILLET3_R)

    # Fillet4
    # the kernel refuses this fillet: 0.3 mm, written as the material it adds along each edge
    with BuildSketch(Plane(origin=(-115.1509, 0, -6.6675), x_dir=(-1, 0, 0), z_dir=(0, -1, 0))) as fillet4_piece_1:
        with BuildLine():
            CenterArc((FILLET4_R, FILLET4_R), FILLET4_R, 180, 90)
            Line((0, FILLET4_R), (0, 0))
            Line((0, 0), (FILLET4_R, 0))
        make_face()
    extrude(amount=0.8)
    with BuildSketch(Plane(origin=(-11.418274206, 0, -7.1501), x_dir=(1, 0, 0), z_dir=(0, -1, 0)), Plane(origin=(-120.815, 7.239, 4.7625), x_dir=(0, 1, 0), z_dir=(1, 0, 0)), Plane(origin=(-120.815, 7.239, 1.7145), x_dir=(0, 0, 1), z_dir=(1, 0, 0))) as fillet4_piece_2:
        with BuildLine():
            CenterArc((FILLET4_R, -FILLET4_R), FILLET4_R, 90, 90)
            Line((0, -FILLET4_R), (0, 0))
            Line((0, 0), (FILLET4_R, 0))
        make_face()
    extrude(amount=0.8)
    with BuildSketch(Plane(origin=(-7.303474206, 0, -5.0927), x_dir=(1, 0, 0), z_dir=(0, -1, 0))) as fillet4_piece_3:
        with BuildLine():
            CenterArc((FILLET4_R * 0.414213562373, -FILLET4_R), FILLET4_R, 90, 45)
            Line((-FILLET4_R * 0.292893218813, -FILLET4_R * 0.292893218813), (0, 0))
            Line((0, 0), (FILLET4_R * 0.414213562373, 0))
        make_face()
    extrude(amount=0.8)
    with BuildSketch(Plane(origin=(-7.303474206, 0, 5.0927), x_dir=(1, 0, 0), z_dir=(0, -1, 0))) as fillet4_piece_4:
        with BuildLine():
            CenterArc((FILLET4_R * 0.414213562373, FILLET4_R), FILLET4_R, 225, 45)
            Line((-FILLET4_R * 0.292893218813, FILLET4_R * 0.292893218813), (0, 0))
            Line((0, 0), (FILLET4_R * 0.414213562373, 0))
        make_face()
    extrude(amount=0.8)
    # the kernel refuses this fillet: 0.3 mm, written as the material it takes off along each edge
    with BuildSketch(Plane(origin=(-115.1509, 0.1059659, 9.2125), x_dir=(-0.7071067811864428, 0, 0.7071067811866523), z_dir=(0, -1, 0))) as fillet4_2_piece_1:
        with BuildLine():
            CenterArc((0.04238636, 0.3), FILLET4_R, 261.194947533, 8.805052467)
            Line((-0.003535534, 0.003535534), (0, 0))
            Line((0, 0), (0.04238636, 0))
        make_face()
    extrude(amount=1.0119318, mode=Mode.SUBTRACT)
    with BuildSketch(Plane(origin=(-9.360874206, 0.310660172, 7.1501), x_dir=(-1, 0, 0), z_dir=(0, -1, 0)), Plane(origin=(-118.3209, 0.310660172, 12.3825), x_dir=(-1, 0, 0), z_dir=(0, -1, 0))) as fillet4_2_piece_2:
        with BuildLine():
            CenterArc((FILLET4_R * 0.414213562373, FILLET4_R), FILLET4_R, 225, 45)
            Line((-FILLET4_R * 0.292893218813, FILLET4_R * 0.292893218813), (0, 0))
            Line((0, 0), (FILLET4_R * 0.414213562373, 0))
        make_face()
    extrude(amount=1.421320344, mode=Mode.SUBTRACT)
    with BuildSketch(Plane(origin=(-121.565, 2.8702, 12.3825), x_dir=(0, 0, -1), z_dir=(1, 0, 0)), Plane(origin=(-121.565, 7.2898, 12.3825), x_dir=(0, 1, 0), z_dir=(1, 0, 0)), Plane(origin=(-121.565, 11.43, 4.7625), x_dir=(0, -1, 0), z_dir=(1, 0, 0)), Plane(origin=(-121.565, 11.43, 1.7145), x_dir=(0, 0, -1), z_dir=(1, 0, 0))) as fillet4_2_piece_3:
        with BuildLine():
            CenterArc((FILLET4_R, -FILLET4_R), FILLET4_R, 90, 90)
            Line((0, -FILLET4_R), (0, 0))
            Line((0, 0), (FILLET4_R, 0))
        make_face()
    extrude(amount=2.3, mode=Mode.SUBTRACT)

    # Fillet5
    fillet5_edges = [part_1.edges().sort_by_distance(p)[0] for p in [
        (-21.694130054, -12.8, 8.8075),
        (-27.694130054, -12.8, 8.8075),
        (-107.17090128, -9.412983007, 8.8075),
        (-114.3509, -3.903576215, 8.8075),
    ]]
    fillet(fillet5_edges, radius=FILLET5_R)


solid = part_1.part
